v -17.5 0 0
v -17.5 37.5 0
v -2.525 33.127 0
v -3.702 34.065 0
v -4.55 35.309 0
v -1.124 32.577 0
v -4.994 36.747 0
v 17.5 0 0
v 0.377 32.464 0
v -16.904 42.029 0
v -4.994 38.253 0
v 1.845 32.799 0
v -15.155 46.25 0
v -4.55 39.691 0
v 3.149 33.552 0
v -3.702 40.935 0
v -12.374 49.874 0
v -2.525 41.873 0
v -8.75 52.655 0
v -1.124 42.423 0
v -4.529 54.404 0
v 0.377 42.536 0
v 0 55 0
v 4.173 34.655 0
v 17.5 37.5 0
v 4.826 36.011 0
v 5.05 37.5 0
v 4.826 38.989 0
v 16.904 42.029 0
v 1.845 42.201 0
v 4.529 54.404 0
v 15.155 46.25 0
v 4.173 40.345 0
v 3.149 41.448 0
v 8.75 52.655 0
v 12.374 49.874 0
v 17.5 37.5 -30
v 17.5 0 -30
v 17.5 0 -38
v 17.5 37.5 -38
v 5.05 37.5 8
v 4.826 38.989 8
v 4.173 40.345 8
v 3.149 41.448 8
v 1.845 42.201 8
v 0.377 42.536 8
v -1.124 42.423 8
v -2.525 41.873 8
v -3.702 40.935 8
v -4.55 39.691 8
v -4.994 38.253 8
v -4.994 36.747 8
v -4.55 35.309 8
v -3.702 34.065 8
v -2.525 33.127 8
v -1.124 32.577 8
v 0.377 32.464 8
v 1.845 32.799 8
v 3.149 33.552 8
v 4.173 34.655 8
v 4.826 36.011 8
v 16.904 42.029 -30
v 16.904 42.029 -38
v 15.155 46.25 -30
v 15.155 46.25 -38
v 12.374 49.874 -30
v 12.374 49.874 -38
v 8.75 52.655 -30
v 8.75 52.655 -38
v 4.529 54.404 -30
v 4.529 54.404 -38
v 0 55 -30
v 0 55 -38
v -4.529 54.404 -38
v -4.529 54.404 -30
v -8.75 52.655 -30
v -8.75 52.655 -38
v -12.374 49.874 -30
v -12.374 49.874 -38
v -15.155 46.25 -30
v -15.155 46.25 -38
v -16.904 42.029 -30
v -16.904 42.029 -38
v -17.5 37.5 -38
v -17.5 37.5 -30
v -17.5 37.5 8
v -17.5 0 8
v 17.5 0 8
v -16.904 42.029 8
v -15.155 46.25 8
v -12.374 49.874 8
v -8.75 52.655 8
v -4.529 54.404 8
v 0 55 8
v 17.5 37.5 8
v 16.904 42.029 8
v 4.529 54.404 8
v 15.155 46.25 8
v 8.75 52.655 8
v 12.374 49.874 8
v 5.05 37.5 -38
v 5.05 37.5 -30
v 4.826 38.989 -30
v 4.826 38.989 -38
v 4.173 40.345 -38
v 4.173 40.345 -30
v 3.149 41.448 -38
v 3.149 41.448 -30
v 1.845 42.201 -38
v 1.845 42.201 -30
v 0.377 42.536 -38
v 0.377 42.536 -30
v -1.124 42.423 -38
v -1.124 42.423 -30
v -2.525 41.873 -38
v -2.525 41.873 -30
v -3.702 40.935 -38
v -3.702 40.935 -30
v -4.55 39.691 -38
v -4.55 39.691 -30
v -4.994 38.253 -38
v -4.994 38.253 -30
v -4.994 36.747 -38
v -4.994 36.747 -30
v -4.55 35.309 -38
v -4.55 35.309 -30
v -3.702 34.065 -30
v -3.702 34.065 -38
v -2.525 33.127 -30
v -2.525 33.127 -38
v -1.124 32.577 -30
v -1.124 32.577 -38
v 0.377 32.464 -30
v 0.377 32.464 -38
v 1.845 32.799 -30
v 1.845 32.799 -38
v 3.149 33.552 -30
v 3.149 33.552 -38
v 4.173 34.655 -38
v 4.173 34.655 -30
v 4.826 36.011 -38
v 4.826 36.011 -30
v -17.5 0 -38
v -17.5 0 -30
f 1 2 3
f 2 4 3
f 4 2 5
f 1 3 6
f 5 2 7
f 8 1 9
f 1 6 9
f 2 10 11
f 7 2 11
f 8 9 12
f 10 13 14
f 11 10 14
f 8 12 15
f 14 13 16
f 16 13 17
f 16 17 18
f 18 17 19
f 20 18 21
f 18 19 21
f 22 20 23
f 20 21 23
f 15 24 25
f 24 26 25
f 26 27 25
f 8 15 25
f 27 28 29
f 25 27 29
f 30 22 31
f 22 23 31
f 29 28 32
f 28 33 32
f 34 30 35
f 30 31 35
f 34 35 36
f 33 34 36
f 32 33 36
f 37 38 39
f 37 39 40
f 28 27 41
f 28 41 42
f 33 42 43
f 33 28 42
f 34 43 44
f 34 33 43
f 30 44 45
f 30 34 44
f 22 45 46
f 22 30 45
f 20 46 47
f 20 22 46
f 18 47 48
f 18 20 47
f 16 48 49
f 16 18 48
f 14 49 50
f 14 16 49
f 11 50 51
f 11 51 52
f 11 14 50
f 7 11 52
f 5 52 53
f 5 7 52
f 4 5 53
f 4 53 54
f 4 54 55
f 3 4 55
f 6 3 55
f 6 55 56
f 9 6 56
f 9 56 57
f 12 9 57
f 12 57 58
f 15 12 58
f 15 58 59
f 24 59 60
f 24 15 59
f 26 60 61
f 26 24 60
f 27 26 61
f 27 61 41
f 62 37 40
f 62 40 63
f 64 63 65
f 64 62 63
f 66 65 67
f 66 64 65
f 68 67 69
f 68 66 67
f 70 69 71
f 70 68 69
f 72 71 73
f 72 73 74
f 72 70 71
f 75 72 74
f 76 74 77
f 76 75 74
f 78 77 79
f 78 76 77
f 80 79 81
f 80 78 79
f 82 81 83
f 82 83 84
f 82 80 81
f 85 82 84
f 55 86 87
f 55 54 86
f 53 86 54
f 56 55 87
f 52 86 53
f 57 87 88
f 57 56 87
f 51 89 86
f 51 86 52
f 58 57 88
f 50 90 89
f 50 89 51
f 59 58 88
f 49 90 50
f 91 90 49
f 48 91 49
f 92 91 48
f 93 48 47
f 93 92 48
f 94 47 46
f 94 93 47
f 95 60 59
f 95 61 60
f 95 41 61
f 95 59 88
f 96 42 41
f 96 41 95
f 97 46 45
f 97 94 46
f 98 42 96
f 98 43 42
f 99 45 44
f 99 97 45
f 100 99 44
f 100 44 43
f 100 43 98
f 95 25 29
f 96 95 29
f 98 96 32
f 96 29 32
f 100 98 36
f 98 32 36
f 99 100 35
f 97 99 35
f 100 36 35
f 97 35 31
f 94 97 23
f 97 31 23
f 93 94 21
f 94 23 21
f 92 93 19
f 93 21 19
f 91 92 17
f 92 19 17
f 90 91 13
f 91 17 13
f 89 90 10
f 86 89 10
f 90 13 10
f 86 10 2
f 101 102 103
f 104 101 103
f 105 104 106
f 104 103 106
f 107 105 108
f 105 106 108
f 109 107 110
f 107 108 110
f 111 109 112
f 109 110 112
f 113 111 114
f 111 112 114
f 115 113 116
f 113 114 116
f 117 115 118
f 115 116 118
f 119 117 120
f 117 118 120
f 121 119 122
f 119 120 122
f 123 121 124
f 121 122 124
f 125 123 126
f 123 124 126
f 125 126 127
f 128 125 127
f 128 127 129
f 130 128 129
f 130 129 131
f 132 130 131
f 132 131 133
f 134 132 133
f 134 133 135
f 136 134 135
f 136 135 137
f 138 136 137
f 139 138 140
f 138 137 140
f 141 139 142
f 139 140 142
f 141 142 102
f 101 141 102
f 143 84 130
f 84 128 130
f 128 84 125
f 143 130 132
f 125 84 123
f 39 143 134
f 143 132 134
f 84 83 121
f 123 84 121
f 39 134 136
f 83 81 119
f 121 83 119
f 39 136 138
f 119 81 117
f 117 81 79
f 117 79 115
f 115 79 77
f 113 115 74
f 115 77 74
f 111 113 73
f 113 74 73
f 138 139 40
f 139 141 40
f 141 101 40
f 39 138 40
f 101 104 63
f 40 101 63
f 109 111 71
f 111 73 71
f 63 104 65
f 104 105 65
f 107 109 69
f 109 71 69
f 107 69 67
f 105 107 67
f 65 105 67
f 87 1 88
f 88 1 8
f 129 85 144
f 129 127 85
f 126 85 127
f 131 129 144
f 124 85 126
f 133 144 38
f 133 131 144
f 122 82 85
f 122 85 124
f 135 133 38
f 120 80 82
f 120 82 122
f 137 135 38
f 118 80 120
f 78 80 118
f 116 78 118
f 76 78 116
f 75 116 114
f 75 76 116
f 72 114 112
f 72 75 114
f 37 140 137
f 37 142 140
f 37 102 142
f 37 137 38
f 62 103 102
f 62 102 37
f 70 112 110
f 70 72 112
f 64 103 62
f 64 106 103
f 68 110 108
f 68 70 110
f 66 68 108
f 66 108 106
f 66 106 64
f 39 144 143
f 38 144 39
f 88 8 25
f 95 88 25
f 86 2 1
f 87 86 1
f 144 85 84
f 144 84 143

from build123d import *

# Parameters (mm, degrees)
SKETCH1_R           = 5.05
BOSS_EXTRUDE1_DEPTH = 8
SKETCH2_R           = 5.05
BOSS_EXTRUDE2_DEPTH = 8


with BuildPart() as part:
    # Sketch1 → Boss-Extrude1 (new body)
    with BuildSketch(Plane.XY):
        with BuildLine():
            Line((-17.5, 0), (17.5, 0))
            Line((17.5, 0), (17.5, 37.5))
            ThreePointArc((17.5, 37.5), (0, 55), (-17.5, 37.5))
            Line((-17.5, 37.5), (-17.5, 0))
        make_face()
        with Locations((0, 37.5)):
            Circle(SKETCH1_R, mode=Mode.SUBTRACT)
    extrude(amount=BOSS_EXTRUDE1_DEPTH)


with BuildPart() as body_2:
    # Sketch2 → Boss-Extrude2 (new body)
    with BuildSketch(Plane.XY.offset(-30)):
        with BuildLine():
            Line((17.5, 0), (17.5, 37.5))
            ThreePointArc((17.5, 37.5), (0, 55), (-17.5, 37.5))
            Line((-17.5, 37.5), (-17.5, 0))
            Line((-17.5, 0), (17.5, 0))
        make_face()
        with Locations((0, 37.5)):
            Circle(SKETCH2_R, mode=Mode.SUBTRACT)
    extrude(amount=-BOSS_EXTRUDE2_DEPTH)


solid = Compound([part.part, body_2.part])
